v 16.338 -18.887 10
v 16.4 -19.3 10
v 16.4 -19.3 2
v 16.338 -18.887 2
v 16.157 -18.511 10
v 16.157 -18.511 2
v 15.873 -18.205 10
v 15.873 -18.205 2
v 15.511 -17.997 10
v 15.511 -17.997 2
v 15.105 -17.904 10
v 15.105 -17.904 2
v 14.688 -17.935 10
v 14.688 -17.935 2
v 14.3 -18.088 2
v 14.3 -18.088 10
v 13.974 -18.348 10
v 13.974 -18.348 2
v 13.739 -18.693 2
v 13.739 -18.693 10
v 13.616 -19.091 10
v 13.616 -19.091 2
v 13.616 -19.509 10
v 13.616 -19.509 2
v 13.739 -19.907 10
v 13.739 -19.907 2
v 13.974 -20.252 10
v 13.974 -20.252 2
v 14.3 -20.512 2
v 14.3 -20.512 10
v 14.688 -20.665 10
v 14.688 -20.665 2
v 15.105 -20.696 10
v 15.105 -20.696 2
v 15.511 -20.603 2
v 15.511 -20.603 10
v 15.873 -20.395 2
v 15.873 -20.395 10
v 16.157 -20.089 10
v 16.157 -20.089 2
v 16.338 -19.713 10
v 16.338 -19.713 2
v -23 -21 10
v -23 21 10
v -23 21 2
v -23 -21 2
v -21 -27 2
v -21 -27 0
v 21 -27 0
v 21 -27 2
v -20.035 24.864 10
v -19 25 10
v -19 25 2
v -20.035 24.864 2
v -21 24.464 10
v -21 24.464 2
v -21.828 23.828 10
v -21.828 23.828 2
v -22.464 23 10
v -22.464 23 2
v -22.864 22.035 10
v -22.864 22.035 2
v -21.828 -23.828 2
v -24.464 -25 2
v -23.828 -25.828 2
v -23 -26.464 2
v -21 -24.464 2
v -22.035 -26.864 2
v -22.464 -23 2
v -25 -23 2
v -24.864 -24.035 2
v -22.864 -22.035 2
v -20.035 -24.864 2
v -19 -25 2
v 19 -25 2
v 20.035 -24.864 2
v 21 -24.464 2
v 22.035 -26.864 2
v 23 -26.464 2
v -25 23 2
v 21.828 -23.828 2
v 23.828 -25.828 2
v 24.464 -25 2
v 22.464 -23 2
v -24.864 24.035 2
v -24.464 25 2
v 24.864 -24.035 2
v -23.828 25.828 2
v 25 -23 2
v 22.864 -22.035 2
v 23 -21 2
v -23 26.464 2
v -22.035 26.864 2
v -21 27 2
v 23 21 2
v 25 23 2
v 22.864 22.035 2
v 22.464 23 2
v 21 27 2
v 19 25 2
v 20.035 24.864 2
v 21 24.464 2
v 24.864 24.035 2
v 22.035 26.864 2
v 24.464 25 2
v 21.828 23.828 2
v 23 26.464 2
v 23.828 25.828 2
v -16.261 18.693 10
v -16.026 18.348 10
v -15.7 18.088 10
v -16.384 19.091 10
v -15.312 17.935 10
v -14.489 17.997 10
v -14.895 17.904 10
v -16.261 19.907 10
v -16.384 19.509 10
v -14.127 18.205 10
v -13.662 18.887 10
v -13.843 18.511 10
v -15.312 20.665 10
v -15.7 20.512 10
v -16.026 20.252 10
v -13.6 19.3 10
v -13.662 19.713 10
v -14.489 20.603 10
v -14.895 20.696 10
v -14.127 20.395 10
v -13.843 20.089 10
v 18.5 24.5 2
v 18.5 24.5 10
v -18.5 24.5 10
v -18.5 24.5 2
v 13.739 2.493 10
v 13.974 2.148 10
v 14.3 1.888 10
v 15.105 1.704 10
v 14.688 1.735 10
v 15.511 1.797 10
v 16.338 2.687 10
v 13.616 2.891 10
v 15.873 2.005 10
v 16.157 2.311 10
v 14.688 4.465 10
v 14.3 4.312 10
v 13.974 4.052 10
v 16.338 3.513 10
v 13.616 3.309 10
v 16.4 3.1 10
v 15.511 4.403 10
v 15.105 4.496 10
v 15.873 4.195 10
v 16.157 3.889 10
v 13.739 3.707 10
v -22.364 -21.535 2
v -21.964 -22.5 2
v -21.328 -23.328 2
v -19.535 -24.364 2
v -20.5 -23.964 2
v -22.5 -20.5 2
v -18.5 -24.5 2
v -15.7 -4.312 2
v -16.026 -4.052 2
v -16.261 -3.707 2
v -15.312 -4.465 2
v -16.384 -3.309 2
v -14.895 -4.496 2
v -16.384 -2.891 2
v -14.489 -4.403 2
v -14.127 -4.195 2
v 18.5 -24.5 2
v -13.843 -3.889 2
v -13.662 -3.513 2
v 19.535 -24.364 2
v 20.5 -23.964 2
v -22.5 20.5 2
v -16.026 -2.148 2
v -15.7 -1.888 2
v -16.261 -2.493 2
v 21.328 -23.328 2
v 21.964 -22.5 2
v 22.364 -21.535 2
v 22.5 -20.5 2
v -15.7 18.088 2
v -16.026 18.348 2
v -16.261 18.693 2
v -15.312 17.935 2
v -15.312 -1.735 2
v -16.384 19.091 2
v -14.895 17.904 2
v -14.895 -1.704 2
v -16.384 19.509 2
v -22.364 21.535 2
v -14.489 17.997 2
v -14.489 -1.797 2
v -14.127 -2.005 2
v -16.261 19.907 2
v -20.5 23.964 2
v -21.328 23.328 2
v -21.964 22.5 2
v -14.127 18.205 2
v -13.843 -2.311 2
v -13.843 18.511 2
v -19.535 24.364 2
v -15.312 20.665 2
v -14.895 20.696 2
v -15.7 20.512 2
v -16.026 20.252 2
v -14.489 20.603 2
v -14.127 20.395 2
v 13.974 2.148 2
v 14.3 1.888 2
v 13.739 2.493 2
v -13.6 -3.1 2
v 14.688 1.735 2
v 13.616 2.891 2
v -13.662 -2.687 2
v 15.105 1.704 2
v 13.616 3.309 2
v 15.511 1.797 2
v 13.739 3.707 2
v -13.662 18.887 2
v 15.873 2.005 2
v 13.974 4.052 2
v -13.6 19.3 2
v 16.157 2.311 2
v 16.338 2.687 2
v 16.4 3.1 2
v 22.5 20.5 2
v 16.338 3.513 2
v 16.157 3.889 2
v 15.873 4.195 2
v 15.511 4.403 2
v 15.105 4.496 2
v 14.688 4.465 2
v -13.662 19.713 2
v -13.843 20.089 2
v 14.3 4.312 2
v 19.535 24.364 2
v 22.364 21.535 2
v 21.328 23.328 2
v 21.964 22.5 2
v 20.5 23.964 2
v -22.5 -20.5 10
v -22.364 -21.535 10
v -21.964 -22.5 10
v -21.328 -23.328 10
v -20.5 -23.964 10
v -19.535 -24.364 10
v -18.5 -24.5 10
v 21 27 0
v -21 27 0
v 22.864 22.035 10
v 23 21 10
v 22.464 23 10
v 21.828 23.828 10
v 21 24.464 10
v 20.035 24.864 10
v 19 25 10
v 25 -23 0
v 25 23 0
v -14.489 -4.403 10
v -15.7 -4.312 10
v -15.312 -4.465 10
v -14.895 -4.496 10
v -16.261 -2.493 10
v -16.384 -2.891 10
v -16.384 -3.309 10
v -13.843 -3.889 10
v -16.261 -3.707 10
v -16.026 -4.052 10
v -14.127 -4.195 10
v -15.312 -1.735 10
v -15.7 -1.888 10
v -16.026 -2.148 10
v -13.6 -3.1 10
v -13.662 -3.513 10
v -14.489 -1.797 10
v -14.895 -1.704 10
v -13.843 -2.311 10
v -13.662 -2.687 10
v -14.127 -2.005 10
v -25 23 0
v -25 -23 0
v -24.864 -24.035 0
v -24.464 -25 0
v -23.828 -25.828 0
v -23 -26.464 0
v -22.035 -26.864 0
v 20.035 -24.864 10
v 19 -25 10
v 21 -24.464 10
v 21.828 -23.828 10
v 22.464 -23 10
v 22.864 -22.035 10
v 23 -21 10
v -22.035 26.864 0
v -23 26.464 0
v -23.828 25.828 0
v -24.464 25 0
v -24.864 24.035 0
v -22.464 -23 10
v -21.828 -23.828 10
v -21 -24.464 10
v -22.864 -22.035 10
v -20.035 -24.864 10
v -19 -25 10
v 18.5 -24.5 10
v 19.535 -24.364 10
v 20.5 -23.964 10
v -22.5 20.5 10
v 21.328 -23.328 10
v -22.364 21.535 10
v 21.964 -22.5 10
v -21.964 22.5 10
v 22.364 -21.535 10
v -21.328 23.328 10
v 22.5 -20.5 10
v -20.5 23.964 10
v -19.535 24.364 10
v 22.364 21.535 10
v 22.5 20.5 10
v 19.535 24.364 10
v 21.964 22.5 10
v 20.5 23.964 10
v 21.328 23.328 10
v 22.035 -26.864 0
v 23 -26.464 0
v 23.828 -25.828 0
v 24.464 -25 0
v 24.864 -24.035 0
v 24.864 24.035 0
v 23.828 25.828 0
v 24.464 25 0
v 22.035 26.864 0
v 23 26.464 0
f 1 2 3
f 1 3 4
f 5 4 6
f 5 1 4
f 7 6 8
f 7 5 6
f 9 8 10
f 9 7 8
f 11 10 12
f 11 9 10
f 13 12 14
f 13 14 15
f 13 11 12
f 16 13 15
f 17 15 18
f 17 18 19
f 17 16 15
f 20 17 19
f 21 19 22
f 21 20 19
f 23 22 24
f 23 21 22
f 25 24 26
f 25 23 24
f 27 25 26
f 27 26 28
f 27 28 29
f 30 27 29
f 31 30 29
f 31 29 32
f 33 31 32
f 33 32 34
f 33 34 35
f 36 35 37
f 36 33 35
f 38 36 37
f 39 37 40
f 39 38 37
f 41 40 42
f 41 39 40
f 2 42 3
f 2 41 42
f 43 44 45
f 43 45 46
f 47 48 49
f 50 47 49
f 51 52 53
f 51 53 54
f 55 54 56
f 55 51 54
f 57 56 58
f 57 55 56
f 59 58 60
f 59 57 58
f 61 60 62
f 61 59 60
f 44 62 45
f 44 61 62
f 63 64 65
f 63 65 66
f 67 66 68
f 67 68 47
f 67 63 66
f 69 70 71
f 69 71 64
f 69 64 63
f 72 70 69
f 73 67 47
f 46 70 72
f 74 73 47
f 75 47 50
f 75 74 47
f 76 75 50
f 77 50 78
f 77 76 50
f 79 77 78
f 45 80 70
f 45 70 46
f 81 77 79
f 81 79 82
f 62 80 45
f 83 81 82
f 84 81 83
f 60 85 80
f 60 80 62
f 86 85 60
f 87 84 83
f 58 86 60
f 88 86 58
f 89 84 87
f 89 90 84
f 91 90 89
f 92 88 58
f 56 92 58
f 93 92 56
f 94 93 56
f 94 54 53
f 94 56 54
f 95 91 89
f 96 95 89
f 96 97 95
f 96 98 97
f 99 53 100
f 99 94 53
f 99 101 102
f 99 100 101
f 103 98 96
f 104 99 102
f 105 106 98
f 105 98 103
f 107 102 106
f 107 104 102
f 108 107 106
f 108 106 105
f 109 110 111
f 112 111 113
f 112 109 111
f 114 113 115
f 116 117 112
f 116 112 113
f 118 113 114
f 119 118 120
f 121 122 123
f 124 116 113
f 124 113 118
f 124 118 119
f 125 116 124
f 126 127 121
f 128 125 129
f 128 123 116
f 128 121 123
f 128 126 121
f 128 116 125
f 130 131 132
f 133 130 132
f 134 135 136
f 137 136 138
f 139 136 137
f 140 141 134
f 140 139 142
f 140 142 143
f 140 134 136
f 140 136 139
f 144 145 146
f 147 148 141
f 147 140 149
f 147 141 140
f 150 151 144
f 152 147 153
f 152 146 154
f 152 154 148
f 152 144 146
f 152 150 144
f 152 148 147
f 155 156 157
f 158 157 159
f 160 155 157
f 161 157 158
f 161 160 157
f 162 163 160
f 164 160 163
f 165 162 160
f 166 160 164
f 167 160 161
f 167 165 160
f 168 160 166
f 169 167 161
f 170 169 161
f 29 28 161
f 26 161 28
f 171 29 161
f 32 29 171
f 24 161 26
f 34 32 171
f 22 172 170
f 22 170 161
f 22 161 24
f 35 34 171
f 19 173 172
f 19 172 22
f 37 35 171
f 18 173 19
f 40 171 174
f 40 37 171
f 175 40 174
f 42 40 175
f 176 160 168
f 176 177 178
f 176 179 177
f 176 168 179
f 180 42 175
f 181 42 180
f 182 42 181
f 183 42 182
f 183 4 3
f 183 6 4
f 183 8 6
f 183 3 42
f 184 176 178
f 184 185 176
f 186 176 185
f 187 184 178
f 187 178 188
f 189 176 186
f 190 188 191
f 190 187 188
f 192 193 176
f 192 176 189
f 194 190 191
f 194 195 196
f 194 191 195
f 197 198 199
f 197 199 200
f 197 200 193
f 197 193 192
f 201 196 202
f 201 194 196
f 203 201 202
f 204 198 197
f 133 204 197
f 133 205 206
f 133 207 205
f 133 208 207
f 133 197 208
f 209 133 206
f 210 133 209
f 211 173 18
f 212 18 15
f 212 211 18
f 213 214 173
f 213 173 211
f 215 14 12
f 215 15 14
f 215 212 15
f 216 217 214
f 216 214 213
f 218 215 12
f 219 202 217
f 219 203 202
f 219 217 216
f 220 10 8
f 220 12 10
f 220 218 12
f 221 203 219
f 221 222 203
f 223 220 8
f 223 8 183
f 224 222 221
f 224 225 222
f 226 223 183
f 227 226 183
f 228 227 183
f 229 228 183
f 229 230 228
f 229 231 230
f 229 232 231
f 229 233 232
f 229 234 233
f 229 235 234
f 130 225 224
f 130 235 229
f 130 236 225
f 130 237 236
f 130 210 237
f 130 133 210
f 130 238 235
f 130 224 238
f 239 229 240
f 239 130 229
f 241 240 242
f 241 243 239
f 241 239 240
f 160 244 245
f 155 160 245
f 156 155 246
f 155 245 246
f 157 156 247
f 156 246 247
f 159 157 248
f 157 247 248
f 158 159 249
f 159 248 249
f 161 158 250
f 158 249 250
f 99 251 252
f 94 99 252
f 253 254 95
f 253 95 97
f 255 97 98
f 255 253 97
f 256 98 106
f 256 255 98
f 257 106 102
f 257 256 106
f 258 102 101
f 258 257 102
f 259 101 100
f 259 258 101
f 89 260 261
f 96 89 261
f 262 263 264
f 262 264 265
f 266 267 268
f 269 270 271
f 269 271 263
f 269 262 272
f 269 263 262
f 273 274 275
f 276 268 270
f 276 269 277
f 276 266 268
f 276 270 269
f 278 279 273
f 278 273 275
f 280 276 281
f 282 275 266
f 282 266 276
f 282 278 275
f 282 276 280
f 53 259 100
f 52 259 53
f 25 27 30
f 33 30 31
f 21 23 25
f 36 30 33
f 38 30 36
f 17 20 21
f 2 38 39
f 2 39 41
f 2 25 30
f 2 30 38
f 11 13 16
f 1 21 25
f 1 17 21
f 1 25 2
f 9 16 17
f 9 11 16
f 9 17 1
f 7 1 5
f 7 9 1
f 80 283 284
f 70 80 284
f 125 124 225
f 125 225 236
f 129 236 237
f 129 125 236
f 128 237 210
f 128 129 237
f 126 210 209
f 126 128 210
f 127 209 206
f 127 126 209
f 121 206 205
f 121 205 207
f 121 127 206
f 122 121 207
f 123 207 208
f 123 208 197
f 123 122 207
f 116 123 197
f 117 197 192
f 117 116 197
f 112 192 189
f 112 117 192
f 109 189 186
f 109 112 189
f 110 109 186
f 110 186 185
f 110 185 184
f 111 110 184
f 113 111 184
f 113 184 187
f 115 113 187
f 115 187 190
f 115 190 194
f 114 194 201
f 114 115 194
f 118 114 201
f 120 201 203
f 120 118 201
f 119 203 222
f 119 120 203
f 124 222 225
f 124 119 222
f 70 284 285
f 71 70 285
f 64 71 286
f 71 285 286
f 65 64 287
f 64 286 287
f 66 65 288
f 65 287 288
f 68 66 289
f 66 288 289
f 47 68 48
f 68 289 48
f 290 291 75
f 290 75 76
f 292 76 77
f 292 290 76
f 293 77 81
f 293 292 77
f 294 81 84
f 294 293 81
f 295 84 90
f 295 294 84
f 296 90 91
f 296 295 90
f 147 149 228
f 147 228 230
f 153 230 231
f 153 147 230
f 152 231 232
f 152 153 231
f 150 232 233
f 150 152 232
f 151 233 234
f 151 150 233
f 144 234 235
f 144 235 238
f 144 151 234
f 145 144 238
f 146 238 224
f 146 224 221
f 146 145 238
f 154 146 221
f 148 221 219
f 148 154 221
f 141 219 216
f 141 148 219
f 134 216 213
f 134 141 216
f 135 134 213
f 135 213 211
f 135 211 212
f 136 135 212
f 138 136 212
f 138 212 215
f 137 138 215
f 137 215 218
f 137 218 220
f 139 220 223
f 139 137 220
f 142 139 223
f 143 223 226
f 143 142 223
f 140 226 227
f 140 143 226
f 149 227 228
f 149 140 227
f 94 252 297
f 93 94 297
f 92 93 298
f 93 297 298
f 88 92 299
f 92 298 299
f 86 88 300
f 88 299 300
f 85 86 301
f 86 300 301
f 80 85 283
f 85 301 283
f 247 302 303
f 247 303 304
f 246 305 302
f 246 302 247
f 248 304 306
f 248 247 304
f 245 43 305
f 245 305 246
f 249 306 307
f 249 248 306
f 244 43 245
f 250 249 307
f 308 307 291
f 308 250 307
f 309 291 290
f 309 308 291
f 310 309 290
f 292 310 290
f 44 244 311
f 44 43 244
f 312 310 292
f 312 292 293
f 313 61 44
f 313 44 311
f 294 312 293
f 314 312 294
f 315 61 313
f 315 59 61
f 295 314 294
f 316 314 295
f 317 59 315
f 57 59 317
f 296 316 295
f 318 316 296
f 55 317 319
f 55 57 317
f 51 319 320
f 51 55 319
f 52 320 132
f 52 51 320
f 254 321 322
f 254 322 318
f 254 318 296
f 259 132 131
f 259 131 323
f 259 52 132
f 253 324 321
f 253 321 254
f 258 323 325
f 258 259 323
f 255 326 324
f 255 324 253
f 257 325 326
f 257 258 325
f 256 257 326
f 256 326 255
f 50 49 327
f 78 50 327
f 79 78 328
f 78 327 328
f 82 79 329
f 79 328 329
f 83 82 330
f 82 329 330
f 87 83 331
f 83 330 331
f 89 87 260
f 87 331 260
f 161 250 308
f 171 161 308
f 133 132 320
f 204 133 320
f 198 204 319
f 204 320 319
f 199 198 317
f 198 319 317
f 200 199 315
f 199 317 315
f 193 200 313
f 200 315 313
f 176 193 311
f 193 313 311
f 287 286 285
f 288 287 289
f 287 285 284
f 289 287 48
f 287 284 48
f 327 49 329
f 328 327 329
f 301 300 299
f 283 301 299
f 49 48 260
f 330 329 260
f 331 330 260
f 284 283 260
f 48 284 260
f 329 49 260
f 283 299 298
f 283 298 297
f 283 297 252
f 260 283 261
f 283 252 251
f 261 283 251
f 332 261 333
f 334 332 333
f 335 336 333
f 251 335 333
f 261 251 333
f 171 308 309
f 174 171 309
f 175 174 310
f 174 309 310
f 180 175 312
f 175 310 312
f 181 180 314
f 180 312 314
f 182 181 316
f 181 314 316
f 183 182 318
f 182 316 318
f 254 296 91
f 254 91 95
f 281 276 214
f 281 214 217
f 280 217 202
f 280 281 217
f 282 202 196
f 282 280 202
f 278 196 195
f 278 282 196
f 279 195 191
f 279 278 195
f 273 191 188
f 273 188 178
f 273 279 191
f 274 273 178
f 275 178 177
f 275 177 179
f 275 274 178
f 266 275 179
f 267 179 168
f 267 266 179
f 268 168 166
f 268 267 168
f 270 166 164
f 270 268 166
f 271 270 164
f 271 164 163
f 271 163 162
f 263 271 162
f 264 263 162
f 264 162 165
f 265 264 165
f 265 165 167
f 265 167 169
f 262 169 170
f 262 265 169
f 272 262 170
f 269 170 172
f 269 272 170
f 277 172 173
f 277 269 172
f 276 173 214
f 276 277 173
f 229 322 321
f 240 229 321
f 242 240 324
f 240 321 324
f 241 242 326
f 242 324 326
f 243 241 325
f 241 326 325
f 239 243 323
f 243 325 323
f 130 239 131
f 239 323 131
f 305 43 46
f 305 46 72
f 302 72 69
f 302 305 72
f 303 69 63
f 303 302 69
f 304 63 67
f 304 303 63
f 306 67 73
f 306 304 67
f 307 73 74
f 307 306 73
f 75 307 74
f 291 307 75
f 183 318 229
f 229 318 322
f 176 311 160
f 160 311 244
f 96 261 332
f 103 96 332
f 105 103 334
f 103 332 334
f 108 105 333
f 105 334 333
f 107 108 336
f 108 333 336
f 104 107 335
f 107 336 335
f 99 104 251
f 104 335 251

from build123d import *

# Parameters (mm, degrees)
BOSS_EXTRUDE1_DEPTH = 10
SKETCH3_R           = 1.4
CUT_EXTRUDE2_DEPTH  = 8


with BuildPart() as part:
    # Sketch1 → Boss-Extrude1 (new body)
    with BuildSketch(Plane.XY):
        with BuildLine():
            Line((-21, -27), (21, -27))
            ThreePointArc((21, -27), (23.828427125, -25.828427125), (25, -23))
            Line((25, -23), (25, 23))
            ThreePointArc((25, 23), (23.828427125, 25.828427125), (21, 27))
            Line((21, 27), (-21, 27))
            ThreePointArc((-21, 27), (-23.828427125, 25.828427125), (-25, 23))
            Line((-25, 23), (-25, -23))
            ThreePointArc((-25, -23), (-23.828427125, -25.828427125), (-21, -27))
        make_face()
    extrude(amount=BOSS_EXTRUDE1_DEPTH)

    # Sketch3 → Cut-Extrude2 (cut)
    with BuildSketch(Plane.XY.offset(10)):
        with BuildLine():
            Line((21, 27), (-21, 27))
            ThreePointArc((-21, 27), (-23.828427125, 25.828427125), (-25, 23))
            Line((-25, 23), (-25, -23))
            ThreePointArc((-25, -23), (-23.828427125, -25.828427125), (-21, -27))
            Line((-21, -27), (21, -27))
            ThreePointArc((21, -27), (23.828427125, -25.828427125), (25, -23))
            Line((25, -23), (25, 23))
            ThreePointArc((25, 23), (23.828427125, 25.828427125), (21, 27))
        make_face()
        with BuildLine():
            Line((-19, -25), (19, -25))
            ThreePointArc((19, -25), (21.828427125, -23.828427125), (23, -21))
            Line((23, -21), (23, 21))
            ThreePointArc((23, 21), (21.828427125, 23.828427125), (19, 25))
            Line((19, 25), (-19, 25))
            ThreePointArc((-19, 25), (-21.828427125, 23.828427125), (-23, 21))
            Line((-23, 21), (-23, -21))
            ThreePointArc((-23, -21), (-21.828427125, -23.828427125), (-19, -25))
        make_face(mode=Mode.SUBTRACT)
        with BuildLine():
            Line((-18.5, -24.5), (18.5, -24.5))
            ThreePointArc((18.5, -24.5), (21.328427125, -23.328427125), (22.5, -20.5))
            Line((22.5, -20.5), (22.5, 20.5))
            ThreePointArc((22.5, 20.5), (21.328427125, 23.328427125), (18.5, 24.5))
            Line((18.5, 24.5), (-18.5, 24.5))
            ThreePointArc((-18.5, 24.5), (-21.328427125, 23.328427125), (-22.5, 20.5))
            Line((-22.5, 20.5), (-22.5, -20.5))
            ThreePointArc((-22.5, -20.5), (-21.328427125, -23.328427125), (-18.5, -24.5))
        make_face()
        with Locations((-15, -3.1)):
            Circle(SKETCH3_R, mode=Mode.SUBTRACT)
        with Locations((15, 3.1)):
            Circle(SKETCH3_R, mode=Mode.SUBTRACT)
        with Locations((-15, 19.3)):
            Circle(SKETCH3_R, mode=Mode.SUBTRACT)
        with Locations((15, -19.3)):
            Circle(SKETCH3_R, mode=Mode.SUBTRACT)
    extrude(amount=-CUT_EXTRUDE2_DEPTH, mode=Mode.SUBTRACT)


solid = part.part
